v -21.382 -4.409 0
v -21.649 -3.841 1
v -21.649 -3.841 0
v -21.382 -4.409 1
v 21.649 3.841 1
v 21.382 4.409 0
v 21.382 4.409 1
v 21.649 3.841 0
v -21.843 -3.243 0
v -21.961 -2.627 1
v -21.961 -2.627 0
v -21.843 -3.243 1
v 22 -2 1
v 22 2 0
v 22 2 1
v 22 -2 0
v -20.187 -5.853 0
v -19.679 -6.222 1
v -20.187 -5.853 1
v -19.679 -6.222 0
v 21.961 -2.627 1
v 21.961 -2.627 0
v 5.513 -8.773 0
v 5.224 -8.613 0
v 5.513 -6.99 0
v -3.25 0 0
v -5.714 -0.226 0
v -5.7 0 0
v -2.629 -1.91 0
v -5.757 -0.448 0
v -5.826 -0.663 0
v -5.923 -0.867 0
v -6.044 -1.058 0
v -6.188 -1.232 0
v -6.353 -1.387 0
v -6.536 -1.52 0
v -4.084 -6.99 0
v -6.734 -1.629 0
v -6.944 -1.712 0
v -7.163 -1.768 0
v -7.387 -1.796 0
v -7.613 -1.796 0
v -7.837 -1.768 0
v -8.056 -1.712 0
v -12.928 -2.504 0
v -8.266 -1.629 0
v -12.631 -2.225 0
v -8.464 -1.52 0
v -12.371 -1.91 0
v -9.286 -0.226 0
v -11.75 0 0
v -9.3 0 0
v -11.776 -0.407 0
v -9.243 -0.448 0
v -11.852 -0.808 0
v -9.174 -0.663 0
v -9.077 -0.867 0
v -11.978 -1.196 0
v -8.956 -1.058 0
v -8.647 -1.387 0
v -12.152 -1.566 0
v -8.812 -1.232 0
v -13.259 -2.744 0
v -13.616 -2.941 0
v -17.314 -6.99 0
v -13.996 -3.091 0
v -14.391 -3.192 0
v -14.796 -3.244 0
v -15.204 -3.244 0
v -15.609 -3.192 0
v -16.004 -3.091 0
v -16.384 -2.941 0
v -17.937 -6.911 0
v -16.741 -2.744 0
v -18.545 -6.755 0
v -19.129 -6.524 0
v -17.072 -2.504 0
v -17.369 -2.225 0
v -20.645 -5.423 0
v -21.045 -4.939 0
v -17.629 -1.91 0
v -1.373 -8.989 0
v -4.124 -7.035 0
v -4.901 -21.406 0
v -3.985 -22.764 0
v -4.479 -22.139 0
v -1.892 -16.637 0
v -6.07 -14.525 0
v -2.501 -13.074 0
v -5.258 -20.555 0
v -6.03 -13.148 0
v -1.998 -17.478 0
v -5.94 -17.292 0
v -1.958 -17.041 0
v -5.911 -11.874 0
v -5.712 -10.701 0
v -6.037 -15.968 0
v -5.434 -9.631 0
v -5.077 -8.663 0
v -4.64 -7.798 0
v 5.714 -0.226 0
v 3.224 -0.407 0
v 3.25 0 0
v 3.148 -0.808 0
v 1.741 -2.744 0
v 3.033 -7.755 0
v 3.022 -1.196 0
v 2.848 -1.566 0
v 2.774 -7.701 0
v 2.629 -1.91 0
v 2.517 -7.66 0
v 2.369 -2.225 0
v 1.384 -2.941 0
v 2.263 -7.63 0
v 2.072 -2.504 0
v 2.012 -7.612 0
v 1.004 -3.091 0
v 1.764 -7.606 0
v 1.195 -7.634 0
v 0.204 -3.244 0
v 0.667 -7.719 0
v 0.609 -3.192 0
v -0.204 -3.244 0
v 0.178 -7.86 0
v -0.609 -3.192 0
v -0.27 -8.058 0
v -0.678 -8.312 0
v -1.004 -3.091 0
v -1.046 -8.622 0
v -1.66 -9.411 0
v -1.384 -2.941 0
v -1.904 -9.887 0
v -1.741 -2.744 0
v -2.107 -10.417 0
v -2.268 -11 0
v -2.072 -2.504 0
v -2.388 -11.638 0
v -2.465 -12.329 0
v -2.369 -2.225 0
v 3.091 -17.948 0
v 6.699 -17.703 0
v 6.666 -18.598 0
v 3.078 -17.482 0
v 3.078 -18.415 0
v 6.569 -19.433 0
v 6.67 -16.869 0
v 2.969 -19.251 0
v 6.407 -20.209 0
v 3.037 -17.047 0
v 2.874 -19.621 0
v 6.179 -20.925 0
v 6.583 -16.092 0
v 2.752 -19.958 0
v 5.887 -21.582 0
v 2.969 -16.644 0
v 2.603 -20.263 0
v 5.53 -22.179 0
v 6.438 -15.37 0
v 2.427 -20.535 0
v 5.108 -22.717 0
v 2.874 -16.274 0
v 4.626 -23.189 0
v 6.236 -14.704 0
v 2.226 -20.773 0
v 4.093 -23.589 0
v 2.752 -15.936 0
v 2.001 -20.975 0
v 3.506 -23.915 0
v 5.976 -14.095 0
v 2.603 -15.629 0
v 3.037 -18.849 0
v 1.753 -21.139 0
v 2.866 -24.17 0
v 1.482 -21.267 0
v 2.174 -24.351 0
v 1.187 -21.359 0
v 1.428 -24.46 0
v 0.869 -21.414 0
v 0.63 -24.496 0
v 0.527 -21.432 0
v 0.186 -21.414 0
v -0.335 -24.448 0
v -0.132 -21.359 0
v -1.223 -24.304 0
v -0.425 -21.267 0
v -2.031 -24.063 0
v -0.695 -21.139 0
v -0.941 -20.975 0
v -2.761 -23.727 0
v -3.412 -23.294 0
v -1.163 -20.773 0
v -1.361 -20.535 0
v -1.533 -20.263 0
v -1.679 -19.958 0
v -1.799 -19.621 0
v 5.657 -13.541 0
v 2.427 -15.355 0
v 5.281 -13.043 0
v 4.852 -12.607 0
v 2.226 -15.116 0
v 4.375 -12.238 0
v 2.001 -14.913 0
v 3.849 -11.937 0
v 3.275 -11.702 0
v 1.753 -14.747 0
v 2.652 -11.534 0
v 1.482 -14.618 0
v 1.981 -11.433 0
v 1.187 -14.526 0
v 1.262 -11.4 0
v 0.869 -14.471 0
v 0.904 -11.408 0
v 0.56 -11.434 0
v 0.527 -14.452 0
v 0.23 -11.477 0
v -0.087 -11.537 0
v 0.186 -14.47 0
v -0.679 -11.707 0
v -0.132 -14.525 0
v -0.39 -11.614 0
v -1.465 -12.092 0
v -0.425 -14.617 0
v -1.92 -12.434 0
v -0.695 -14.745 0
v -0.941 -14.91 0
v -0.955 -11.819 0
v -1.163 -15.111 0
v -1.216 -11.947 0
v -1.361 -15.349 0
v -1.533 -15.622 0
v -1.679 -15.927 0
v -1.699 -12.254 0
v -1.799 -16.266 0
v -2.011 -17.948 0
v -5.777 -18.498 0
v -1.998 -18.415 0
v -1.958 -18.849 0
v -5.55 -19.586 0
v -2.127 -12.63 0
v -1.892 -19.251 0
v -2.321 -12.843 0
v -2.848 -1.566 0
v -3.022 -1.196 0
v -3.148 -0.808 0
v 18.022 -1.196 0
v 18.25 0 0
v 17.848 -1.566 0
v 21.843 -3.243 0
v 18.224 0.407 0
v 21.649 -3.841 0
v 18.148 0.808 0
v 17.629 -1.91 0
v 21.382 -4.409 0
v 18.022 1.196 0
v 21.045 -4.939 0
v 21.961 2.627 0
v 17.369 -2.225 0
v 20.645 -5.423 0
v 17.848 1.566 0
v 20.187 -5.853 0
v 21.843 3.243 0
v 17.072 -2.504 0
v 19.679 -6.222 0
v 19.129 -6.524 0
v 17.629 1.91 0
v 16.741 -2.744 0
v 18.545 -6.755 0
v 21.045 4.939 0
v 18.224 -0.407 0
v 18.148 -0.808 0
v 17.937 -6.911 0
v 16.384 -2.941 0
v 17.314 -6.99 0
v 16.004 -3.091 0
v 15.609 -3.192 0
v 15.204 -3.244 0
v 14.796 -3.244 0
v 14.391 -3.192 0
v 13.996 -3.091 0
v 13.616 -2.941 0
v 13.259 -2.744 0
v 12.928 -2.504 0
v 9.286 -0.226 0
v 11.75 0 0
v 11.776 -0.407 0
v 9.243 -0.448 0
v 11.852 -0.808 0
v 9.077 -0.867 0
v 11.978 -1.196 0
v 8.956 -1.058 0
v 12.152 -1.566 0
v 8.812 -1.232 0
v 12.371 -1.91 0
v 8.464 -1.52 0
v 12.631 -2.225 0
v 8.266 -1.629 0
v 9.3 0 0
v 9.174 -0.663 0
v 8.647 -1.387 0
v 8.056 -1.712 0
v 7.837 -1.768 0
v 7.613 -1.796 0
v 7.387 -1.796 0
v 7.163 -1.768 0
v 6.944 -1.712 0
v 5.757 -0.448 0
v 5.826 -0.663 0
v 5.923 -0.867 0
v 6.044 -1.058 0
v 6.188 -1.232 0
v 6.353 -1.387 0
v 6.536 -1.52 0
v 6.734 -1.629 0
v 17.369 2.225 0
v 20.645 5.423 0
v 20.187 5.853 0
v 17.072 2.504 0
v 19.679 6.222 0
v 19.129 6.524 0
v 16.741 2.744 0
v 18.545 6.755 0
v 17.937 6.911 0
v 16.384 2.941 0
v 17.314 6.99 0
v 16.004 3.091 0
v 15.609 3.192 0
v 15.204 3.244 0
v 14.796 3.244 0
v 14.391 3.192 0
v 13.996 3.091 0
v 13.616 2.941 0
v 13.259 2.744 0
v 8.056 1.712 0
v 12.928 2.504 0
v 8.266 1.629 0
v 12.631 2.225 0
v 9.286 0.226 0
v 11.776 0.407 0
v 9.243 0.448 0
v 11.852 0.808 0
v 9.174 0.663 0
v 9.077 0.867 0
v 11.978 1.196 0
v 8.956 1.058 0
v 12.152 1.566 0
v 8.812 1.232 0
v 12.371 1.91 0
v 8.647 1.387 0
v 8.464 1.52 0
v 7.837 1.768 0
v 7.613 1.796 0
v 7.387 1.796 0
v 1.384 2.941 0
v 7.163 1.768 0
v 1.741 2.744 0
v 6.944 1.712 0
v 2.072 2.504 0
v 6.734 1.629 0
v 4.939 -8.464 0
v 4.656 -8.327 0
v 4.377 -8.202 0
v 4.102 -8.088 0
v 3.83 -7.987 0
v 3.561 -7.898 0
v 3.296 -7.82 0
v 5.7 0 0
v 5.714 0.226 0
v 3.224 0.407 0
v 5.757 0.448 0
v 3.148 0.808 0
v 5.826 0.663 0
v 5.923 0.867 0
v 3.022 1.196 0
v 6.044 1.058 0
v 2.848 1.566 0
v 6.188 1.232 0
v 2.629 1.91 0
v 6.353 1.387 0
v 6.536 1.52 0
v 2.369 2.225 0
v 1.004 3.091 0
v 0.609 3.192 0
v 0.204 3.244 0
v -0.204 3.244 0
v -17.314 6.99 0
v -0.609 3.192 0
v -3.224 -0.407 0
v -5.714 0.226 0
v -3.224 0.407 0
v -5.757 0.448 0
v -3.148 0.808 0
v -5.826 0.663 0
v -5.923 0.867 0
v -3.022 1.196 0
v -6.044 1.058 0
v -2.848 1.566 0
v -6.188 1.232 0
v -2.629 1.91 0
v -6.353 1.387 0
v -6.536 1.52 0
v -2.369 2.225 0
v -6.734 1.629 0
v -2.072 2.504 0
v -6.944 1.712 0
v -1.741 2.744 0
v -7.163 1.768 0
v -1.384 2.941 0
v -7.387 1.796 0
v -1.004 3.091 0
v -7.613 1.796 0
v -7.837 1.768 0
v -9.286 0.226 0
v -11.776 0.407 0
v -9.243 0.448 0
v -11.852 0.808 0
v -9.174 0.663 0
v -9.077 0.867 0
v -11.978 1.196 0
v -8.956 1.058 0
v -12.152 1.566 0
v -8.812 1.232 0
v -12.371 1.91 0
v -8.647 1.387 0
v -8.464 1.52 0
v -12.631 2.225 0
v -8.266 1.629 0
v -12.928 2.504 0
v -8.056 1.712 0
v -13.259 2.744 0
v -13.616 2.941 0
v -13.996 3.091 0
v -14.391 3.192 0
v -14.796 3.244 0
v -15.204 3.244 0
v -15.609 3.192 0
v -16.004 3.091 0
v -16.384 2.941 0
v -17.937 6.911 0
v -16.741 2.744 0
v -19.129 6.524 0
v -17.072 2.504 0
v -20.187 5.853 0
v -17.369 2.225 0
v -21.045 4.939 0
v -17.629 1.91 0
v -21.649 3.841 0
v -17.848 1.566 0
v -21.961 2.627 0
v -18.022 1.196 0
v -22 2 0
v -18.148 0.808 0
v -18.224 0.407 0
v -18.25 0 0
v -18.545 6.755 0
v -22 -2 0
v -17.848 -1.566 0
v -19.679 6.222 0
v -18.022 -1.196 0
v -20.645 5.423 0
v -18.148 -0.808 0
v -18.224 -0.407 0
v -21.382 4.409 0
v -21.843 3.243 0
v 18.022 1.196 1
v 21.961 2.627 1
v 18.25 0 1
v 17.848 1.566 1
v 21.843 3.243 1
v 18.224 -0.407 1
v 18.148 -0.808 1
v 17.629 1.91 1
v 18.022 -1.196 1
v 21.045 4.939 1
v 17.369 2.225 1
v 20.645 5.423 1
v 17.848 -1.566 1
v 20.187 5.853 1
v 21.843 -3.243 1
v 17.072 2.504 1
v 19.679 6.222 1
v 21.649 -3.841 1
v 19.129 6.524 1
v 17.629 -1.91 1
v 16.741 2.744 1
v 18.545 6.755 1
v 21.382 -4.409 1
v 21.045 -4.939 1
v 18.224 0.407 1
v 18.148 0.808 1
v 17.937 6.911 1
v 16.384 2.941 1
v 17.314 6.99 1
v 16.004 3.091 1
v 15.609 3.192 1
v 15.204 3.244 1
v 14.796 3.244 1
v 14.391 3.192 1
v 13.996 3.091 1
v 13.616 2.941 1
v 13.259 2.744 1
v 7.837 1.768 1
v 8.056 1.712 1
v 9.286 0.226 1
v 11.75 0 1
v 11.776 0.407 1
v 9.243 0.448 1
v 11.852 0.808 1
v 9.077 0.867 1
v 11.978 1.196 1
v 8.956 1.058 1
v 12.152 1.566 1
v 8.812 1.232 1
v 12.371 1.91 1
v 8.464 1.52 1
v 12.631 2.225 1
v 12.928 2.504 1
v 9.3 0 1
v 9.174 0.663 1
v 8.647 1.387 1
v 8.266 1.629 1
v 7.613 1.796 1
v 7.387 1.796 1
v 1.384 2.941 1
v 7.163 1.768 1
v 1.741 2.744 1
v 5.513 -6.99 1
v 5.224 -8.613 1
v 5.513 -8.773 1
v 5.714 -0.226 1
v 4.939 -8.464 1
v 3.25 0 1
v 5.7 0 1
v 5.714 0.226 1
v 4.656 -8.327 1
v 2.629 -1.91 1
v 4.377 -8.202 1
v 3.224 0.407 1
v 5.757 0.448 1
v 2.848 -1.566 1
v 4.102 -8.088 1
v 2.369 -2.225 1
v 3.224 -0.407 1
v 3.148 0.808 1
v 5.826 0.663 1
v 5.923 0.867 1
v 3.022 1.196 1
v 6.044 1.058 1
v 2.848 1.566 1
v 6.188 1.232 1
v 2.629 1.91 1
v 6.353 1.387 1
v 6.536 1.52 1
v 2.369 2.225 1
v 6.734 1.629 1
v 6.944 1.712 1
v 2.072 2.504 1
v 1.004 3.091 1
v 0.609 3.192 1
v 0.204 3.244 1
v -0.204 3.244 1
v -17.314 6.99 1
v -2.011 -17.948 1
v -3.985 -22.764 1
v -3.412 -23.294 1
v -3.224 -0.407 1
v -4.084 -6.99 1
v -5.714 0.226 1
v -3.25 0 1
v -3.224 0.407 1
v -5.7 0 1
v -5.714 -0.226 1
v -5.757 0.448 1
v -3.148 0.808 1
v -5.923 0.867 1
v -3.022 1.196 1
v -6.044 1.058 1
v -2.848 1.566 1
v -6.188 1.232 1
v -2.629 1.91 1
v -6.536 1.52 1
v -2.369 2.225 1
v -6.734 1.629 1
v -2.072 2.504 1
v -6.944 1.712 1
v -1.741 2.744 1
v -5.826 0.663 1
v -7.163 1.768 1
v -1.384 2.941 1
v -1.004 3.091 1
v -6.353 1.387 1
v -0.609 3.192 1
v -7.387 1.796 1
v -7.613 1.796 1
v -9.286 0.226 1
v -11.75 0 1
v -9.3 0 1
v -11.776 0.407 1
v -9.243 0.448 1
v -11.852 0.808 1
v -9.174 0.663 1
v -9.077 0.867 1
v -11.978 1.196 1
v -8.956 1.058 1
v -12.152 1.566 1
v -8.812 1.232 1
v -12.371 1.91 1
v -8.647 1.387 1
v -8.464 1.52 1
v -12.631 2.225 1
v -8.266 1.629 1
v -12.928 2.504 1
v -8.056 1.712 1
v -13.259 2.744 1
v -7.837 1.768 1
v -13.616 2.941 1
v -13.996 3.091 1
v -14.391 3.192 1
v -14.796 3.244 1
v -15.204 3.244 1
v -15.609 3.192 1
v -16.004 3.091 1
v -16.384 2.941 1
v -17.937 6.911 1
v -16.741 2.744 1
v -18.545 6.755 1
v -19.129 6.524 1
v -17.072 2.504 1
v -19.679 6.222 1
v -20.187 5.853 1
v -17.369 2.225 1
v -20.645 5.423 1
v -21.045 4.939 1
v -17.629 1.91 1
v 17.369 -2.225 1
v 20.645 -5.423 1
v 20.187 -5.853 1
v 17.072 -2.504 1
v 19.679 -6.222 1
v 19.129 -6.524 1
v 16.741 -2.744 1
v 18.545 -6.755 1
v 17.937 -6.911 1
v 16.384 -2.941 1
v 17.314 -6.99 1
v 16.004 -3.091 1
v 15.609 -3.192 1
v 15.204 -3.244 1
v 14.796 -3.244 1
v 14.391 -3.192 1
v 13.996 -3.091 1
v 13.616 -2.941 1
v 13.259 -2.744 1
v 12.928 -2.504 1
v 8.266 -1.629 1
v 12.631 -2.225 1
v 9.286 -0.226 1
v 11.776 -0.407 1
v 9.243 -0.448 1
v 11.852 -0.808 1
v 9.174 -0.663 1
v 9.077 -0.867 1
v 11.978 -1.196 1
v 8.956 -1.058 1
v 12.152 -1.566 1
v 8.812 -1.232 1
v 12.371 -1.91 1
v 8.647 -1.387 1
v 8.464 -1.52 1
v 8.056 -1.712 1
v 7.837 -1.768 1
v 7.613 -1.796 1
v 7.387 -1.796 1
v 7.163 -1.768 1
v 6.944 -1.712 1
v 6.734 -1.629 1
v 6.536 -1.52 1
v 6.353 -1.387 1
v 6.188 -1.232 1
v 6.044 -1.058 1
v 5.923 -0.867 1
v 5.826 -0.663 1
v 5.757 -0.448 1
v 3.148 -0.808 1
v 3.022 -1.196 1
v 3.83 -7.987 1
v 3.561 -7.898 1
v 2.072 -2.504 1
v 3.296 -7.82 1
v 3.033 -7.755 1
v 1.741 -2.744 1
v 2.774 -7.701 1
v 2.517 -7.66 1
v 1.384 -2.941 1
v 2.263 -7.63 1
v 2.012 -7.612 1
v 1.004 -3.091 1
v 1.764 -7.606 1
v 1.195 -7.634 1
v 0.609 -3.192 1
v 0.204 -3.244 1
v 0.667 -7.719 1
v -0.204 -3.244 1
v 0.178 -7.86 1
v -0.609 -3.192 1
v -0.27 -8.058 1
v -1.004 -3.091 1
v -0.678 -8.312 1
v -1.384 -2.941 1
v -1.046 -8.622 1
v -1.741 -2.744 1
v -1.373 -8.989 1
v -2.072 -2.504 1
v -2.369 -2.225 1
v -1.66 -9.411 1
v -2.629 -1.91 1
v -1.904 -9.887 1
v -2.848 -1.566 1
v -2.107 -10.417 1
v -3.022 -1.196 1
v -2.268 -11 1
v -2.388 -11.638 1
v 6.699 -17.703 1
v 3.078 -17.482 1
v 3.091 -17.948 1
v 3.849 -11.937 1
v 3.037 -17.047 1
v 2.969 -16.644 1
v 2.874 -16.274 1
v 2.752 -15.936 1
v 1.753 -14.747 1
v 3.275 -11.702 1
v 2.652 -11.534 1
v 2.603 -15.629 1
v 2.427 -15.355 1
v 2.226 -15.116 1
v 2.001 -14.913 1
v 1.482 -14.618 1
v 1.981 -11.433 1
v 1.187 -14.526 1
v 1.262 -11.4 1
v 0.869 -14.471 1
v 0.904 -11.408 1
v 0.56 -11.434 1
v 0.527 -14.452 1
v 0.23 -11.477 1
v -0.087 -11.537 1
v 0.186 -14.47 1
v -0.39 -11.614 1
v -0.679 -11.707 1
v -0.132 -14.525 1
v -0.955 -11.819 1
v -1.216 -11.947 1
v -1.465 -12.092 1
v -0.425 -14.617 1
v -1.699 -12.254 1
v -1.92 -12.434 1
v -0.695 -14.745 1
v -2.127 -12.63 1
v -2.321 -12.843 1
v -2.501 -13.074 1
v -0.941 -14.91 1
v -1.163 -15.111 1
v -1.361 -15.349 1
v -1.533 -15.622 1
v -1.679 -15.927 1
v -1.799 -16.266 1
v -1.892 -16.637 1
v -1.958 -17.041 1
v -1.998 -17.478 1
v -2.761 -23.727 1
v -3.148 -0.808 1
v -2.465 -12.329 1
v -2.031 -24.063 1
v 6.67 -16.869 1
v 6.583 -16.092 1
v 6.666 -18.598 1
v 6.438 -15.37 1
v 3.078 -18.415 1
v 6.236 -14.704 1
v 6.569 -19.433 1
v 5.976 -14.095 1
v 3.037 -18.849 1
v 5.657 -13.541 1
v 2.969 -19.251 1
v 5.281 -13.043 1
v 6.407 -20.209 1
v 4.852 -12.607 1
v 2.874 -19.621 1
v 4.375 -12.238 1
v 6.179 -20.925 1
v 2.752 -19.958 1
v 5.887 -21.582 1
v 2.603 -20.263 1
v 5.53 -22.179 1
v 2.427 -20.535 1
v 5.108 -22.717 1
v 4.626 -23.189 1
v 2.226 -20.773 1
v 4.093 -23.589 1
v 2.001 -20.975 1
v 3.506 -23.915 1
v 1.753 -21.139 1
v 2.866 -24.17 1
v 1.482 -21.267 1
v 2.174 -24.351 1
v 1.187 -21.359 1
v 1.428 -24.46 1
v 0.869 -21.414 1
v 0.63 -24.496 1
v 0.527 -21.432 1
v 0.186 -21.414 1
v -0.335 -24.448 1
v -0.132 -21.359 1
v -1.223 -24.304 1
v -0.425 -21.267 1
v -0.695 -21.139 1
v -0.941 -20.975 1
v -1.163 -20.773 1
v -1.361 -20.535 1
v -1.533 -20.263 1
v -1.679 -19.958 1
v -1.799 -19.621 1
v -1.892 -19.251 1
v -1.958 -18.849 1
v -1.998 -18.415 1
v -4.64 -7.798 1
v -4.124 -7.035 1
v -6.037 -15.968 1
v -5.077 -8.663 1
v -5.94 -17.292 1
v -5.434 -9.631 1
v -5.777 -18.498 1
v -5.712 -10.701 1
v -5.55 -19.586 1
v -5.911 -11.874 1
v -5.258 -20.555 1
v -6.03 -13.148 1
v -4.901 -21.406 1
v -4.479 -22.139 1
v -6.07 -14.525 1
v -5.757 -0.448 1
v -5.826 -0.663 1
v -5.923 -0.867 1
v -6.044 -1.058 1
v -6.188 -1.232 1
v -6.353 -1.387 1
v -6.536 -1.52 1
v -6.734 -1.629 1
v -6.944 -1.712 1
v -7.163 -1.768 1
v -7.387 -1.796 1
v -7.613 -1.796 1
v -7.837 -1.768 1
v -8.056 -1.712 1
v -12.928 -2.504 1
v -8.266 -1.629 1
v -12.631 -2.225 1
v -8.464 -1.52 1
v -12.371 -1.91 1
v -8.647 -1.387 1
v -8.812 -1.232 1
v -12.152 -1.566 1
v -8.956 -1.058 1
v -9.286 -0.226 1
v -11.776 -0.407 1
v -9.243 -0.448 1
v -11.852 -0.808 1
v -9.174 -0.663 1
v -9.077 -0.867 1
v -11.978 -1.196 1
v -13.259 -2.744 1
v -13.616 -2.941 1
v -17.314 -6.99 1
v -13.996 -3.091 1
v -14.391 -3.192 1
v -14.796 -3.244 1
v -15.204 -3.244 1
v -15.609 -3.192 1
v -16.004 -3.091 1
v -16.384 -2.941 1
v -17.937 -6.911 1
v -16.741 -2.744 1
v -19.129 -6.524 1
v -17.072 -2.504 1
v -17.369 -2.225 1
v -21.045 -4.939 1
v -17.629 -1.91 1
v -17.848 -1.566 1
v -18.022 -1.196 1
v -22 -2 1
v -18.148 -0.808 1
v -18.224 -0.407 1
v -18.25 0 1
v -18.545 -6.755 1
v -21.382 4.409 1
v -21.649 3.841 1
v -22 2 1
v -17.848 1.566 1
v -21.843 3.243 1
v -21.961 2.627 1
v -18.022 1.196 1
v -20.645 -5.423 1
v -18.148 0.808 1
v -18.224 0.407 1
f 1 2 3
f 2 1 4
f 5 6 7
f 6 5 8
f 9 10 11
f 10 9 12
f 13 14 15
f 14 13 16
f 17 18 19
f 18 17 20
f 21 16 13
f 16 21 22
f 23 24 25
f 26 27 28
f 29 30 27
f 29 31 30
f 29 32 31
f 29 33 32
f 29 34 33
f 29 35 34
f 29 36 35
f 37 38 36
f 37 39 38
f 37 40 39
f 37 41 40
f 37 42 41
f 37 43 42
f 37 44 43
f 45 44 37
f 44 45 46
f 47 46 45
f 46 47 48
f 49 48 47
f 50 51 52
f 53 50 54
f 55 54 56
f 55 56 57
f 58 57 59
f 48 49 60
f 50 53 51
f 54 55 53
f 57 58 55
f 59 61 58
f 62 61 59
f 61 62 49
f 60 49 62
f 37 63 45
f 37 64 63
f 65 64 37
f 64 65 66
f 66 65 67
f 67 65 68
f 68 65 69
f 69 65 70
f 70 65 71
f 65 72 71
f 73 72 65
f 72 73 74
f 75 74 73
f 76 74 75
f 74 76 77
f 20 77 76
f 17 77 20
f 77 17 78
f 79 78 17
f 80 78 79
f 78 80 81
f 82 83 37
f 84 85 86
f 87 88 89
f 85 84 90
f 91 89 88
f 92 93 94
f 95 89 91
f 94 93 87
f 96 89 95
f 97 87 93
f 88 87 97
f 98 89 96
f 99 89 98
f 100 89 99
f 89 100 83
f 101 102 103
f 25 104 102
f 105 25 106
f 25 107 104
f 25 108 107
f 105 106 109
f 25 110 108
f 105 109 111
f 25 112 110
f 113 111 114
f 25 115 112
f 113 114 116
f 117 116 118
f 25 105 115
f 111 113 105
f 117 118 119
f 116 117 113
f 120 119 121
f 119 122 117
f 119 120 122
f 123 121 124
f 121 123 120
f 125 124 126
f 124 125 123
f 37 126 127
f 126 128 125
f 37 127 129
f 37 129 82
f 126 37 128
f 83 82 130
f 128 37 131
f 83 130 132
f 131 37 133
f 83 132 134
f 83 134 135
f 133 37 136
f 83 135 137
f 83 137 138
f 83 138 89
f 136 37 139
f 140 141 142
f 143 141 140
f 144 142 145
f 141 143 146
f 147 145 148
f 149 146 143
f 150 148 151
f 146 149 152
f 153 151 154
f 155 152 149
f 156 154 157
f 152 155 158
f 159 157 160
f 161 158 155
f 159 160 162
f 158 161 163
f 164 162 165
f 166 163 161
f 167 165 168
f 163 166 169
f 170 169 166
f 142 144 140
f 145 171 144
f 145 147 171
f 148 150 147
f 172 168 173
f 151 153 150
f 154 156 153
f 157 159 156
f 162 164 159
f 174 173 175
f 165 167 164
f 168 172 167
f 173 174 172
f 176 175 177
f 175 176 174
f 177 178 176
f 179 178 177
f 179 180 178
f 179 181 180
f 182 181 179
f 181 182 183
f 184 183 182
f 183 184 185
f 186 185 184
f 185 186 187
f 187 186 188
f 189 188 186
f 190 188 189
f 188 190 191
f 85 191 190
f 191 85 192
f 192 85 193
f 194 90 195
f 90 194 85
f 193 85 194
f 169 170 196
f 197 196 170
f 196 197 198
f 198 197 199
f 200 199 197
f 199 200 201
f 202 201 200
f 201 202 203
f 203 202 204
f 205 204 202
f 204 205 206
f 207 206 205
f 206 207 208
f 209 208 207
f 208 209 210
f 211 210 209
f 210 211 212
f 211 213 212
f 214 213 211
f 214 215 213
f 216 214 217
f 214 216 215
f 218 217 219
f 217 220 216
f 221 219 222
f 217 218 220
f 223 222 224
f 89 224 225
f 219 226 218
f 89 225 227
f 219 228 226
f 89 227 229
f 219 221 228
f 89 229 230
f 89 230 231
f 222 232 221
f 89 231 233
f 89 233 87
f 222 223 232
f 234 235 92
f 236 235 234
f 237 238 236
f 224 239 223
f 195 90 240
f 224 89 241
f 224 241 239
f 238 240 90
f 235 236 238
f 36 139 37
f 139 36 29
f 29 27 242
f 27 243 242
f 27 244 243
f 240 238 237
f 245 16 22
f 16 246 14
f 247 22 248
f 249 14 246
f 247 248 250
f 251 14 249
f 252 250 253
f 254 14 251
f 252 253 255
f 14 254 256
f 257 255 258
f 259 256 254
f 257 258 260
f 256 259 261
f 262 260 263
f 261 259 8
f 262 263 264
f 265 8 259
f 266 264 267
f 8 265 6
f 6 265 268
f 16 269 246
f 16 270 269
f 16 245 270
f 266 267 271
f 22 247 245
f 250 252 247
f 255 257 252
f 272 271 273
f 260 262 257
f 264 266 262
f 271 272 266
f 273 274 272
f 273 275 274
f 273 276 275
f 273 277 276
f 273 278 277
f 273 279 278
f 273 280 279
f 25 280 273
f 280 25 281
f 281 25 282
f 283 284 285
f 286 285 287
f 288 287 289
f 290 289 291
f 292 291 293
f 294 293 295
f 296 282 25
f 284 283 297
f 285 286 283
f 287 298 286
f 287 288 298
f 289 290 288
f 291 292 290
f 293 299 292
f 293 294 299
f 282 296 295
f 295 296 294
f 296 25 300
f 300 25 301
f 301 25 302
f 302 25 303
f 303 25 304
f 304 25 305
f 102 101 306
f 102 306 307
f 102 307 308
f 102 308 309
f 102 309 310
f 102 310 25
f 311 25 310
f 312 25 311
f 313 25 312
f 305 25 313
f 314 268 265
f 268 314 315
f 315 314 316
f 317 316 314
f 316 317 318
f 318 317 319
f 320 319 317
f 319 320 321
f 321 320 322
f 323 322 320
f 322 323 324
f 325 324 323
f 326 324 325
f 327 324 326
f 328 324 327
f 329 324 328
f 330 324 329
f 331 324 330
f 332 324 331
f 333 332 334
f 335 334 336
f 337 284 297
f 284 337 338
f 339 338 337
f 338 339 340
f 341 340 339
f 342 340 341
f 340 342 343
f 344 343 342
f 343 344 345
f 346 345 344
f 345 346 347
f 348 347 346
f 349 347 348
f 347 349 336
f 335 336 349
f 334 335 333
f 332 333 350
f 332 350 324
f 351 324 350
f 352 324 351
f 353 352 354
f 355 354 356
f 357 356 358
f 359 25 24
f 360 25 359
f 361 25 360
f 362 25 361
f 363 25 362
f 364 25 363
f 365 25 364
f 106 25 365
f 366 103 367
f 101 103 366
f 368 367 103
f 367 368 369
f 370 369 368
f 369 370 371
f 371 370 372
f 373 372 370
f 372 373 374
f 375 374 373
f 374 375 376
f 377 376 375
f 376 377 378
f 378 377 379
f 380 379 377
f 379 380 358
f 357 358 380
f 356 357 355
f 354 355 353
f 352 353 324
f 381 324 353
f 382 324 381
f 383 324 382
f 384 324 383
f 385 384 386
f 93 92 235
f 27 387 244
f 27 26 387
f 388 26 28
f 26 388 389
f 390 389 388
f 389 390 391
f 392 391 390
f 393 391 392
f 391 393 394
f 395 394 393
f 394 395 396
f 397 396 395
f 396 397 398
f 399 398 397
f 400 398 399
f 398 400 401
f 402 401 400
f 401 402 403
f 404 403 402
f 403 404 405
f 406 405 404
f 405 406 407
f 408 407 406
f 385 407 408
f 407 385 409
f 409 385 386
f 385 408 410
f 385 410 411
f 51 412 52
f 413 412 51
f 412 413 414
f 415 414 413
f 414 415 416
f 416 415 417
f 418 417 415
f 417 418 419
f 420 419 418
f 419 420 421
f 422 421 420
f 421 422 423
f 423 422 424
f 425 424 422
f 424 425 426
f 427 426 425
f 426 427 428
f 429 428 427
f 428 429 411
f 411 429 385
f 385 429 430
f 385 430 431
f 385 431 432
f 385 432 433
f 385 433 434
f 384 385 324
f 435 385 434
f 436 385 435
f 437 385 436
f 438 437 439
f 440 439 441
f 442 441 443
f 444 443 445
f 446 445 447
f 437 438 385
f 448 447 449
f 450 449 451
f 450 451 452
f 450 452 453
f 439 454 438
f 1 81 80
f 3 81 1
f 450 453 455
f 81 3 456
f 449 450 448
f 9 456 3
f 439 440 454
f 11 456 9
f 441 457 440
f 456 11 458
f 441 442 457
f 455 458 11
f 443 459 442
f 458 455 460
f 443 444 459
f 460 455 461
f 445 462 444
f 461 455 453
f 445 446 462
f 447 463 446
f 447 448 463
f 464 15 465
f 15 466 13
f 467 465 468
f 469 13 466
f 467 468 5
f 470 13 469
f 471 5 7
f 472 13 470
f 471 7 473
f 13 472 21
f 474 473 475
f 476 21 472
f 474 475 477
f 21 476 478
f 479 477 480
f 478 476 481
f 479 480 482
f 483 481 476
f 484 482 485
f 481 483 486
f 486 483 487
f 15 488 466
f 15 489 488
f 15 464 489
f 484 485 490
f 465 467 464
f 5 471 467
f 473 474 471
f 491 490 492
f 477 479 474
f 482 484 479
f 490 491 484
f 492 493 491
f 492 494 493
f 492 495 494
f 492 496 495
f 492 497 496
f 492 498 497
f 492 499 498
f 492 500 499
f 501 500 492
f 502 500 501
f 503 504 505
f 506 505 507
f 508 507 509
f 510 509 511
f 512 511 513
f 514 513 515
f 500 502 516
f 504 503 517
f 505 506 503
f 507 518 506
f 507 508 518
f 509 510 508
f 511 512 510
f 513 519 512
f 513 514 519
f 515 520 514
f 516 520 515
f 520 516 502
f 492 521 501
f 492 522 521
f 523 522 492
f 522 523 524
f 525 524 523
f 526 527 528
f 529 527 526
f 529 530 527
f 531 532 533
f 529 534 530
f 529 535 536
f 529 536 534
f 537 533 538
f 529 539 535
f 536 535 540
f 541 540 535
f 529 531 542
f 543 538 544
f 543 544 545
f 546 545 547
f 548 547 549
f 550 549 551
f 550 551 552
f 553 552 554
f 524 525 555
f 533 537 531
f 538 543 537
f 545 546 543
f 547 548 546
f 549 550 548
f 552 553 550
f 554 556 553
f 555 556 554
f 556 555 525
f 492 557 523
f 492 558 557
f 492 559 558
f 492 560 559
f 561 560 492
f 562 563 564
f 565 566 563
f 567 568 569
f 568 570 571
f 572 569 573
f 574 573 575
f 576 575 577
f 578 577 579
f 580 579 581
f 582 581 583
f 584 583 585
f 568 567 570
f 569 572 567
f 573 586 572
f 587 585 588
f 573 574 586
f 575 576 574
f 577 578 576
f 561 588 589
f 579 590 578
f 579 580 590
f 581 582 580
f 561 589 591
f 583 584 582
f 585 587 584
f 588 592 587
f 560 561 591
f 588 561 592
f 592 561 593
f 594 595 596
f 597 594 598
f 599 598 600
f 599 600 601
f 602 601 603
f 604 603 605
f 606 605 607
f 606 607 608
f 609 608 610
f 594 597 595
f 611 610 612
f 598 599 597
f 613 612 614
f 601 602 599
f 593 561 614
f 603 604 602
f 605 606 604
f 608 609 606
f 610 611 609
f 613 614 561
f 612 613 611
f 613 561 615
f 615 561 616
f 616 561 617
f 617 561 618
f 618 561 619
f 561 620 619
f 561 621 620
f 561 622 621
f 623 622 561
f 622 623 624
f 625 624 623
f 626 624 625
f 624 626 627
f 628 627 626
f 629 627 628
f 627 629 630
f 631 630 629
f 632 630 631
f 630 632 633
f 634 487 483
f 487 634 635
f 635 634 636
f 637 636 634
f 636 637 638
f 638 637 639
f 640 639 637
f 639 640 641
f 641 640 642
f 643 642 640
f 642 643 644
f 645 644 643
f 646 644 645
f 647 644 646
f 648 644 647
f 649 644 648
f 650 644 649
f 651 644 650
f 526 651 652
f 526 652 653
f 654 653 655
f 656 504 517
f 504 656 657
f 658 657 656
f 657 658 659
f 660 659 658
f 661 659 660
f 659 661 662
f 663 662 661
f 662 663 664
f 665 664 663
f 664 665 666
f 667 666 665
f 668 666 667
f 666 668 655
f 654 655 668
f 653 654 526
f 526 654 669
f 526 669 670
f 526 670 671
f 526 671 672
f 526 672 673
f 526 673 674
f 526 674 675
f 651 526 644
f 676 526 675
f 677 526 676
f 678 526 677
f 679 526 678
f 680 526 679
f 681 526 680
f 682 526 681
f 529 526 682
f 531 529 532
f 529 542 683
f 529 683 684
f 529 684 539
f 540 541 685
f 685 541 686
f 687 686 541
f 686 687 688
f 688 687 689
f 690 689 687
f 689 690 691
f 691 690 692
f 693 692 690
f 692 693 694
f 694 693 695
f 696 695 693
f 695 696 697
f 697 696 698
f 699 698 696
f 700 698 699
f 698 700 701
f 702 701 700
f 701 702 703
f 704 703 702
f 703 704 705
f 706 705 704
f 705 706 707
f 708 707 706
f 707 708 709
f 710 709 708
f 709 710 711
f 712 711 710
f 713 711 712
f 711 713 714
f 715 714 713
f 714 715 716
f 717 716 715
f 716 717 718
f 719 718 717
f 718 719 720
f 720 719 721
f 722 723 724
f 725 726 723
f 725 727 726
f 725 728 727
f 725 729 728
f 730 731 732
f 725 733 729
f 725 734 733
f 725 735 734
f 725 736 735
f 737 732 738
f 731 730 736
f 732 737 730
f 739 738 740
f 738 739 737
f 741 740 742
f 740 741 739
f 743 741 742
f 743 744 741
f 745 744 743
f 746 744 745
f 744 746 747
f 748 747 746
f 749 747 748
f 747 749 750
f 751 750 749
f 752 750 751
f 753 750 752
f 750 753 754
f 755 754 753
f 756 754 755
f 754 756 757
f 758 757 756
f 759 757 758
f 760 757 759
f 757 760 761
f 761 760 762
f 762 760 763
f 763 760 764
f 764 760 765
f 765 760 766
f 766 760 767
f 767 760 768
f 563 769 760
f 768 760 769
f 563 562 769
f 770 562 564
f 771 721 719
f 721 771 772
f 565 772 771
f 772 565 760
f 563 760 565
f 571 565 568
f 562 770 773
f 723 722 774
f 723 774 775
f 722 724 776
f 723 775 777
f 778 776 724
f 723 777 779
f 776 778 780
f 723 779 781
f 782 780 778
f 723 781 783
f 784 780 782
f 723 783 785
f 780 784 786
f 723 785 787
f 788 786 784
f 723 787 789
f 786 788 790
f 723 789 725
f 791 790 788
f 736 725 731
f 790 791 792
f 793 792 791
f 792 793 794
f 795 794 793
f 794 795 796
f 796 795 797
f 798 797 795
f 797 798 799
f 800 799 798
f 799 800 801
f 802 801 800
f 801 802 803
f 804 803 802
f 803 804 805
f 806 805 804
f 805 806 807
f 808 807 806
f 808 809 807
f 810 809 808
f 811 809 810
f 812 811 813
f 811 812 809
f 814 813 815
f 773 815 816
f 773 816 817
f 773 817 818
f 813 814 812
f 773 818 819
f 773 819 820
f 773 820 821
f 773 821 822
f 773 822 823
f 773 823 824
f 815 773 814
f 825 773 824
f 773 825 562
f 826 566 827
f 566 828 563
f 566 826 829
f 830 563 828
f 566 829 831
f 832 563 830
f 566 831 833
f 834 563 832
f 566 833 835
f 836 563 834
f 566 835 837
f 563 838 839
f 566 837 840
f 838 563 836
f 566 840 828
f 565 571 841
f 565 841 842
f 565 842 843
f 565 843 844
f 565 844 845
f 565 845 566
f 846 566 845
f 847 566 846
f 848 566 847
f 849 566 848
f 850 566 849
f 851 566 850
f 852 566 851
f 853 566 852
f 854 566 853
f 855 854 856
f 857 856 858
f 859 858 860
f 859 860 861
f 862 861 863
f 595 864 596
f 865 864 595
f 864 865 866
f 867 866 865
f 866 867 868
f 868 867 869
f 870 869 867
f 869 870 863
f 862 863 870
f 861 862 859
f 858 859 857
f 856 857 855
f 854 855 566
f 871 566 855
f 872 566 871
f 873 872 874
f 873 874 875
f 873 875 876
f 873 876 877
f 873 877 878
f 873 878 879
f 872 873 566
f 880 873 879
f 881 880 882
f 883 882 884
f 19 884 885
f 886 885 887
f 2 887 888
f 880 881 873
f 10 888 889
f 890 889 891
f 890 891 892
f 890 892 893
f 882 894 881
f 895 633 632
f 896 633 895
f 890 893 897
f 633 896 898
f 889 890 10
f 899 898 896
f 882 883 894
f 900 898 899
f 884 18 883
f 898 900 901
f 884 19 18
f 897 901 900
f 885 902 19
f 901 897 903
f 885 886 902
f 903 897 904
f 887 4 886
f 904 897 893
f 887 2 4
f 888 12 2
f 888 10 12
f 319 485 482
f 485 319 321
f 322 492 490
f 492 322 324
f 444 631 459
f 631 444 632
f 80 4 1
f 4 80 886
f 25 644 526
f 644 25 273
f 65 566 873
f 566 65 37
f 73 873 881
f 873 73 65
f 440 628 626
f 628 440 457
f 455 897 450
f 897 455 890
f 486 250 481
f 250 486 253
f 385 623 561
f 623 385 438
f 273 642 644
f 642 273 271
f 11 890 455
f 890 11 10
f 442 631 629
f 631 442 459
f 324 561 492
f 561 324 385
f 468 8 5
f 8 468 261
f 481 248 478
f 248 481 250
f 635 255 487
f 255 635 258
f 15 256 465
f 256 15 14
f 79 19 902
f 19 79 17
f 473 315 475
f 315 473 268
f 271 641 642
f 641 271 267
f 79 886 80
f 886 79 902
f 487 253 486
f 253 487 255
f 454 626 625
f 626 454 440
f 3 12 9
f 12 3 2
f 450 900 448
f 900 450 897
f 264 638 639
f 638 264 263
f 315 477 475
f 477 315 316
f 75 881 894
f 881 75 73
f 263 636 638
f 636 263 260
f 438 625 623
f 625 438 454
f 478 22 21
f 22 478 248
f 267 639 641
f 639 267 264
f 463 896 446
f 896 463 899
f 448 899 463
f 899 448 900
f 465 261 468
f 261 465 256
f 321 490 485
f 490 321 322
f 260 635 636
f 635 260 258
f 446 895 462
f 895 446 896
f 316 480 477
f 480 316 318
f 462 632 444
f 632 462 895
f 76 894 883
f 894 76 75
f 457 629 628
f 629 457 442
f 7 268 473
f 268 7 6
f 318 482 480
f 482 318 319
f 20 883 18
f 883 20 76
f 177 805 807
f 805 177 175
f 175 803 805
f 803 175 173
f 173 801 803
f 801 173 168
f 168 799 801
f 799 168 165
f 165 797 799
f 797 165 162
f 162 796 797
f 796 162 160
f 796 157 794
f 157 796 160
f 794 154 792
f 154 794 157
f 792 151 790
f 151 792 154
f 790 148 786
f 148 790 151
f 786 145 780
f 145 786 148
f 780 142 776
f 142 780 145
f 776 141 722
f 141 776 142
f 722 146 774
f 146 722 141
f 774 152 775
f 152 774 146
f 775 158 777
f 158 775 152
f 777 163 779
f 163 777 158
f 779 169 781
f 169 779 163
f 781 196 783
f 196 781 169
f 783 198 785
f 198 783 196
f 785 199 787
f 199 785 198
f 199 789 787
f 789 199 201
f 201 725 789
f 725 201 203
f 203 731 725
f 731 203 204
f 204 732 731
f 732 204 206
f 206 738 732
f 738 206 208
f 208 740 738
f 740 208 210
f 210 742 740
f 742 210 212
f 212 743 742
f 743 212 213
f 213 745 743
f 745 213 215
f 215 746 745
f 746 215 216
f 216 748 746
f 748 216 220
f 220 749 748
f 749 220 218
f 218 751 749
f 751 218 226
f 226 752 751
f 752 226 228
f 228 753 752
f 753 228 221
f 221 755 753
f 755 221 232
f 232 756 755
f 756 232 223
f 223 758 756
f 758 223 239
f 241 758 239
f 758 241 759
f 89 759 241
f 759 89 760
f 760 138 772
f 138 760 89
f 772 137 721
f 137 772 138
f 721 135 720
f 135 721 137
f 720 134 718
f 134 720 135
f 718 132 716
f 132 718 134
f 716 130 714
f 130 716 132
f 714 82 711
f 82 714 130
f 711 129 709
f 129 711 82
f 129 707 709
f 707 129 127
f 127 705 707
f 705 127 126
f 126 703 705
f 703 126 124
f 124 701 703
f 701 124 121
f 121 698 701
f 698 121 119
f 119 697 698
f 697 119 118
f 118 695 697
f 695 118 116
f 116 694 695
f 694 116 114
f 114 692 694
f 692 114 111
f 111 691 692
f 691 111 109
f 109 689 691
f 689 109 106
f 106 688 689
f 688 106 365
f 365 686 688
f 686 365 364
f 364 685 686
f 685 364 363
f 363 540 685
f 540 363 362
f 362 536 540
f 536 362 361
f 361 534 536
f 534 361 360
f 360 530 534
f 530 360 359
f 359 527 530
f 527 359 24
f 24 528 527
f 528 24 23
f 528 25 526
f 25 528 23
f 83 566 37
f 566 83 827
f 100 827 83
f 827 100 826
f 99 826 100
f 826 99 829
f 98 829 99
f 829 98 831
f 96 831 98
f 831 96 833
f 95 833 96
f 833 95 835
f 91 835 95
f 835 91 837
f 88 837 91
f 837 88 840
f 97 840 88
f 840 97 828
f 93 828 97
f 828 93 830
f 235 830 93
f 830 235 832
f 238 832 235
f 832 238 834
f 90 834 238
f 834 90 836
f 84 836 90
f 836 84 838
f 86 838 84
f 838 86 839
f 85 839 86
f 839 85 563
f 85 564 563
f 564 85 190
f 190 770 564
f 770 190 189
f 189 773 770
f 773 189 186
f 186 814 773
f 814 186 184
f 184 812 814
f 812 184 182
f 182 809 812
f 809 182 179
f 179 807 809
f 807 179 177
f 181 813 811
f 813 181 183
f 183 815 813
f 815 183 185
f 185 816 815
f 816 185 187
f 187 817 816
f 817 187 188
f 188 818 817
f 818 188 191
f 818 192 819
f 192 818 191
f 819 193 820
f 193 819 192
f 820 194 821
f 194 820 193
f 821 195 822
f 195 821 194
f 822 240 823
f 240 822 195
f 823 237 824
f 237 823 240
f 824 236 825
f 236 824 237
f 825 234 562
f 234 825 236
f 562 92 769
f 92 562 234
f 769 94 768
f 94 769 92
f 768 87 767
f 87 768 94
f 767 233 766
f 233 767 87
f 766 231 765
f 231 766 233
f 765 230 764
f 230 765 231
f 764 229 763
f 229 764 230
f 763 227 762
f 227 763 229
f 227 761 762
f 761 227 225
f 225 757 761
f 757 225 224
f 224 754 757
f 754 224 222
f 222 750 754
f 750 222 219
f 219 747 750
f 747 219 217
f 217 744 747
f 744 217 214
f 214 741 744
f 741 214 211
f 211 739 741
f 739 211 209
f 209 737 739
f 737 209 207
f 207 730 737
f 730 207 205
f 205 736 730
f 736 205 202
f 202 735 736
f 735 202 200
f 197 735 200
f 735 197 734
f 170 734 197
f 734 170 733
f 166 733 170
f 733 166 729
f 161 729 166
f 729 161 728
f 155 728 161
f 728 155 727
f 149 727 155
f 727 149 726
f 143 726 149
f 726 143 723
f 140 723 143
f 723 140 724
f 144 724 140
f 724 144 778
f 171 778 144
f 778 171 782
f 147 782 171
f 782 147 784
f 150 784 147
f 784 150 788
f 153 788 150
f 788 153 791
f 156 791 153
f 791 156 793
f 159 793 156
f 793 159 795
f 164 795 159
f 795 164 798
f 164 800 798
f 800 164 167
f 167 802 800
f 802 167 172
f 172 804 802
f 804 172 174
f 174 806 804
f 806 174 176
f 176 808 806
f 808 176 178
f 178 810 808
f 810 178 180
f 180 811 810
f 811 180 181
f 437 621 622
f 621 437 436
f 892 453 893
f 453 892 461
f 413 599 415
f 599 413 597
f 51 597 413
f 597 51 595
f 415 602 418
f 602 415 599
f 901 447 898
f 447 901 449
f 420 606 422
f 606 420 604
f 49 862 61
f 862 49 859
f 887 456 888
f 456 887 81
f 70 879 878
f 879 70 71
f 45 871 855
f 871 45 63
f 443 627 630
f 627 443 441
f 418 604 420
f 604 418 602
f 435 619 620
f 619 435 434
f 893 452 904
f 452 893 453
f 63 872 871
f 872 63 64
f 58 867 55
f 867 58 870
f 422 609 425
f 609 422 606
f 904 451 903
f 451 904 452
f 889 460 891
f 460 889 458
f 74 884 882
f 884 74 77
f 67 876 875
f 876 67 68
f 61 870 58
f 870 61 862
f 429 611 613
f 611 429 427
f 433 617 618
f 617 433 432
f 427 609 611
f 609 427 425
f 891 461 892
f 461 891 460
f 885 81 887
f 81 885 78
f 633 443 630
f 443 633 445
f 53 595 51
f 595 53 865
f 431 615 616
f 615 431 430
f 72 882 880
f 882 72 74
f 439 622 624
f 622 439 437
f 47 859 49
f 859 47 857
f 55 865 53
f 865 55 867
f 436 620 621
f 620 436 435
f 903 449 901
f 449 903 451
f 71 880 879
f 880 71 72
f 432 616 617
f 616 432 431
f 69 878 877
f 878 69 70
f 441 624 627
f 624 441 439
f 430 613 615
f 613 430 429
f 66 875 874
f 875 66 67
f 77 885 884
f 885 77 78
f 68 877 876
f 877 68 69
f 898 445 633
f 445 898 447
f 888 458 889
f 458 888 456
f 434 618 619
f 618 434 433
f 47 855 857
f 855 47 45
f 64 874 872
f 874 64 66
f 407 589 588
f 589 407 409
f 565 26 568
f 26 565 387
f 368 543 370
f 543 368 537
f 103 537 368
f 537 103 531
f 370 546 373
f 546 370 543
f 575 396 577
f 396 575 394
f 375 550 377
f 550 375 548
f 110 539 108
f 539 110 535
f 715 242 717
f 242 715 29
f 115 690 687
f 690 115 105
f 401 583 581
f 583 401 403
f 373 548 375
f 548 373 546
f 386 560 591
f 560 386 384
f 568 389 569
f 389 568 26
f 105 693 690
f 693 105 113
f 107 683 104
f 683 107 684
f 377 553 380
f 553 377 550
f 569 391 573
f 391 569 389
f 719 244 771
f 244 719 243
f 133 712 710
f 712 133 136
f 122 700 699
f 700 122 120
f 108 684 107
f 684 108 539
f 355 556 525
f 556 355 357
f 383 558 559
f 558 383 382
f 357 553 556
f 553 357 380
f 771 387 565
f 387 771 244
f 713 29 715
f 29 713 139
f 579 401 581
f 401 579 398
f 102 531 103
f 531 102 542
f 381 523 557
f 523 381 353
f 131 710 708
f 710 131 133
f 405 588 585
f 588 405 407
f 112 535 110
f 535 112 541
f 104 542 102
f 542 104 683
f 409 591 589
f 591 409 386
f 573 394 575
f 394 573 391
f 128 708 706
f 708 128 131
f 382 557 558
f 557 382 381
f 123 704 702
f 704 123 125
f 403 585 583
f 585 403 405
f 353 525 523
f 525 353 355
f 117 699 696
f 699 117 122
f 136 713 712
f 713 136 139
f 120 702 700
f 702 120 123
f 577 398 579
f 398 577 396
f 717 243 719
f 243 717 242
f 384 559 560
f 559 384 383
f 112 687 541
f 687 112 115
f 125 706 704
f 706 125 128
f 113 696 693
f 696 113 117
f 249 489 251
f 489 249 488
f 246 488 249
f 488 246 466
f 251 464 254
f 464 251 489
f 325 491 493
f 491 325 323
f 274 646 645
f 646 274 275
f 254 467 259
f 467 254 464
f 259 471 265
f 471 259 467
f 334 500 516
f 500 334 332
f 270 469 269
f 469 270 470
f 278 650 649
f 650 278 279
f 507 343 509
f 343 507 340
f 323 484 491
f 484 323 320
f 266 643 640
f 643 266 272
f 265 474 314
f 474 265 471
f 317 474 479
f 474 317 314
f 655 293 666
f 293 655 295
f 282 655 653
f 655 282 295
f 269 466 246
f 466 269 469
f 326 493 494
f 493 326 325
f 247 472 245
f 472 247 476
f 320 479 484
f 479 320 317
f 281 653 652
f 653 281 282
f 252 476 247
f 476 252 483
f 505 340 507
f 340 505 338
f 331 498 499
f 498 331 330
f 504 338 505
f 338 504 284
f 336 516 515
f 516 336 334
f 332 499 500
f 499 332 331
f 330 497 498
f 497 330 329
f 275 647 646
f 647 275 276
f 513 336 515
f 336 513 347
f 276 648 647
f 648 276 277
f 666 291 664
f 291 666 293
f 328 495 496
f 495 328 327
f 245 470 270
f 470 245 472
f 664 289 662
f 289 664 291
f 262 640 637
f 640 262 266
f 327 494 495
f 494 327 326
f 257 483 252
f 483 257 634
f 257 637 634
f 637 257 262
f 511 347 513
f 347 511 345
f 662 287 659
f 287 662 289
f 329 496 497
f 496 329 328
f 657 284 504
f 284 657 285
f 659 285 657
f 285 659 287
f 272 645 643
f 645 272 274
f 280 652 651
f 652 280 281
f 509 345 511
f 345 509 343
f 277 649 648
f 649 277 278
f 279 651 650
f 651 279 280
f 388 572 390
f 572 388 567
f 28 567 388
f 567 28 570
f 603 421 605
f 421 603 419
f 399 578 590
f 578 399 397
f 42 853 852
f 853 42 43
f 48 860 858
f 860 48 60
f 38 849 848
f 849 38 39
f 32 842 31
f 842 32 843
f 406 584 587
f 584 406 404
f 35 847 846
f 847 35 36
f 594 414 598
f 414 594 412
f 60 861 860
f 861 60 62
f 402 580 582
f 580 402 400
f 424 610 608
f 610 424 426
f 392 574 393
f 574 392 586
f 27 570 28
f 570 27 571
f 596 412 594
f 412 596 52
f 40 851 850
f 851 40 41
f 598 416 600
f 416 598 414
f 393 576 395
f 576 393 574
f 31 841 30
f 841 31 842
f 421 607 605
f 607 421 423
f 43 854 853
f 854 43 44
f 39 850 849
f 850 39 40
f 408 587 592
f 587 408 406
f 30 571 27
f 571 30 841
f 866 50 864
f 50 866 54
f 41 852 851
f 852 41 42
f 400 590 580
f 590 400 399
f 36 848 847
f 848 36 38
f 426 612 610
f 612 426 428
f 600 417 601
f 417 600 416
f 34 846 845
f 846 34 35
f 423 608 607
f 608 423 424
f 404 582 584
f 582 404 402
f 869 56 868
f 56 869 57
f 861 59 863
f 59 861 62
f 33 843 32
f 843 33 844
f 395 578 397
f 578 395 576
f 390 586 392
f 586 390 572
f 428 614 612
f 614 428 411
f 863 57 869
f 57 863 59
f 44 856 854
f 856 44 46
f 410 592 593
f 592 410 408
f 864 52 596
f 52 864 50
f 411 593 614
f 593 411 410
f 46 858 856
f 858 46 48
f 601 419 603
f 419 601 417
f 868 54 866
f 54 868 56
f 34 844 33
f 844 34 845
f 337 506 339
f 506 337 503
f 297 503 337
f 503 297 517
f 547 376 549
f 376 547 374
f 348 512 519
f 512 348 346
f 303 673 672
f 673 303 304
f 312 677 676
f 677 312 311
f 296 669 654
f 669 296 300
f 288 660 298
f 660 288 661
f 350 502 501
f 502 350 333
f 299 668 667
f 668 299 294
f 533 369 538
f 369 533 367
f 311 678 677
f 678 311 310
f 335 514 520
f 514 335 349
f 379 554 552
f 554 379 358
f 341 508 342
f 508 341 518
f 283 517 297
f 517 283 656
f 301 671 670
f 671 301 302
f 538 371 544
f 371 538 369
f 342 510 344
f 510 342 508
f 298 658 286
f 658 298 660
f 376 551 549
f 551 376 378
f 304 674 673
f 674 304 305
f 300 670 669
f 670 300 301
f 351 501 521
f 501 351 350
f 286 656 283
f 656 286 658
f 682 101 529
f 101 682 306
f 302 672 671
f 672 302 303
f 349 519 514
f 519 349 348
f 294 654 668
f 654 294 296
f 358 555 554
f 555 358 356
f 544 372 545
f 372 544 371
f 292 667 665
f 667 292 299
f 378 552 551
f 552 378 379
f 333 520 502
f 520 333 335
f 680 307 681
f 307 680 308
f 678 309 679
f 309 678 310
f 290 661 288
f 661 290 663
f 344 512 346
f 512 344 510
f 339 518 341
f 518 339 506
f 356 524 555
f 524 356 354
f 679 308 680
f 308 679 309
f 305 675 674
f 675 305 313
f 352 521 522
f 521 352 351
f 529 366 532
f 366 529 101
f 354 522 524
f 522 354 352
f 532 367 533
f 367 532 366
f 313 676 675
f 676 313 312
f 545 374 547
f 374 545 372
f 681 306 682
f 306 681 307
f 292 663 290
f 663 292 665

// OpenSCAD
$fn = 50;


difference() {
	union() {
		*color(alpha = 1.0000000000, c = "gray") {
			translate(v = [0, 14, 0]) {
				linear_extrude(height = 1) {
					text(font = "Arial:style=Bold", halign = "center", size = 4.5000000000, text = "COMMENT description oobb_plate_shape_p_type_1_depth_3_width_1_thickness_6_extra_oobb_size", valign = "center");
				}
			}
		}
		hull() {
			translate(v = [-17.0000000000, 2.0000000000, 0]) {
				cylinder(h = 1, r = 5);
			}
			translate(v = [17.0000000000, 2.0000000000, 0]) {
				cylinder(h = 1, r = 5);
			}
			translate(v = [-17.0000000000, -2.0000000000, 0]) {
				cylinder(h = 1, r = 5);
			}
			translate(v = [17.0000000000, -2.0000000000, 0]) {
				cylinder(h = 1, r = 5);
			}
		}
		translate(v = [0, -5, 0]) {
			linear_extrude(height = 1) {
				text(font = "DejaVu Sans Mono:style=Bold", halign = "center", size = 19.0000000000, text = "6", valign = "top");
			}
		}
	}
	union() {
		*color(alpha = 1.0000000000, c = "gray") {
			translate(v = [0, 14, 0]) {
				linear_extrude(height = 1) {
					text(font = "Arial:style=Bold", halign = "center", size = 4.5000000000, text = "COMMENT description oobb_holes_shape_n_type_3_width_1_thickness_6_extra_oobb_size_1_height_'all'_holes_true_both_holes", valign = "center");
				}
			}
		}
		translate(v = [-15.0000000000, 0.0000000000, 0]) {
			translate(v = [0, 0, -50]) {
				cylinder(h = 100, r = 3.2500000000);
			}
		}
		translate(v = [0, 0, -50]) {
			cylinder(h = 100, r = 3.2500000000);
		}
		translate(v = [15.0000000000, 0.0000000000, 0]) {
			translate(v = [0, 0, -50]) {
				cylinder(h = 100, r = 3.2500000000);
			}
		}
		translate(v = [-15.0000000000, 0.0000000000, 0]) {
			translate(v = [0, 0, -50]) {
				cylinder(h = 100, r = 1.8000000000);
			}
		}
		translate(v = [-7.5000000000, 0.0000000000, 0]) {
			translate(v = [0, 0, -50]) {
				cylinder(h = 100, r = 1.8000000000);
			}
		}
		translate(v = [0, 0, -50]) {
			cylinder(h = 100, r = 1.8000000000);
		}
		translate(v = [7.5000000000, 0.0000000000, 0]) {
			translate(v = [0, 0, -50]) {
				cylinder(h = 100, r = 1.8000000000);
			}
		}
		translate(v = [15.0000000000, 0.0000000000, 0]) {
			translate(v = [0, 0, -50]) {
				cylinder(h = 100, r = 1.8000000000);
			}
		}
	}
}
